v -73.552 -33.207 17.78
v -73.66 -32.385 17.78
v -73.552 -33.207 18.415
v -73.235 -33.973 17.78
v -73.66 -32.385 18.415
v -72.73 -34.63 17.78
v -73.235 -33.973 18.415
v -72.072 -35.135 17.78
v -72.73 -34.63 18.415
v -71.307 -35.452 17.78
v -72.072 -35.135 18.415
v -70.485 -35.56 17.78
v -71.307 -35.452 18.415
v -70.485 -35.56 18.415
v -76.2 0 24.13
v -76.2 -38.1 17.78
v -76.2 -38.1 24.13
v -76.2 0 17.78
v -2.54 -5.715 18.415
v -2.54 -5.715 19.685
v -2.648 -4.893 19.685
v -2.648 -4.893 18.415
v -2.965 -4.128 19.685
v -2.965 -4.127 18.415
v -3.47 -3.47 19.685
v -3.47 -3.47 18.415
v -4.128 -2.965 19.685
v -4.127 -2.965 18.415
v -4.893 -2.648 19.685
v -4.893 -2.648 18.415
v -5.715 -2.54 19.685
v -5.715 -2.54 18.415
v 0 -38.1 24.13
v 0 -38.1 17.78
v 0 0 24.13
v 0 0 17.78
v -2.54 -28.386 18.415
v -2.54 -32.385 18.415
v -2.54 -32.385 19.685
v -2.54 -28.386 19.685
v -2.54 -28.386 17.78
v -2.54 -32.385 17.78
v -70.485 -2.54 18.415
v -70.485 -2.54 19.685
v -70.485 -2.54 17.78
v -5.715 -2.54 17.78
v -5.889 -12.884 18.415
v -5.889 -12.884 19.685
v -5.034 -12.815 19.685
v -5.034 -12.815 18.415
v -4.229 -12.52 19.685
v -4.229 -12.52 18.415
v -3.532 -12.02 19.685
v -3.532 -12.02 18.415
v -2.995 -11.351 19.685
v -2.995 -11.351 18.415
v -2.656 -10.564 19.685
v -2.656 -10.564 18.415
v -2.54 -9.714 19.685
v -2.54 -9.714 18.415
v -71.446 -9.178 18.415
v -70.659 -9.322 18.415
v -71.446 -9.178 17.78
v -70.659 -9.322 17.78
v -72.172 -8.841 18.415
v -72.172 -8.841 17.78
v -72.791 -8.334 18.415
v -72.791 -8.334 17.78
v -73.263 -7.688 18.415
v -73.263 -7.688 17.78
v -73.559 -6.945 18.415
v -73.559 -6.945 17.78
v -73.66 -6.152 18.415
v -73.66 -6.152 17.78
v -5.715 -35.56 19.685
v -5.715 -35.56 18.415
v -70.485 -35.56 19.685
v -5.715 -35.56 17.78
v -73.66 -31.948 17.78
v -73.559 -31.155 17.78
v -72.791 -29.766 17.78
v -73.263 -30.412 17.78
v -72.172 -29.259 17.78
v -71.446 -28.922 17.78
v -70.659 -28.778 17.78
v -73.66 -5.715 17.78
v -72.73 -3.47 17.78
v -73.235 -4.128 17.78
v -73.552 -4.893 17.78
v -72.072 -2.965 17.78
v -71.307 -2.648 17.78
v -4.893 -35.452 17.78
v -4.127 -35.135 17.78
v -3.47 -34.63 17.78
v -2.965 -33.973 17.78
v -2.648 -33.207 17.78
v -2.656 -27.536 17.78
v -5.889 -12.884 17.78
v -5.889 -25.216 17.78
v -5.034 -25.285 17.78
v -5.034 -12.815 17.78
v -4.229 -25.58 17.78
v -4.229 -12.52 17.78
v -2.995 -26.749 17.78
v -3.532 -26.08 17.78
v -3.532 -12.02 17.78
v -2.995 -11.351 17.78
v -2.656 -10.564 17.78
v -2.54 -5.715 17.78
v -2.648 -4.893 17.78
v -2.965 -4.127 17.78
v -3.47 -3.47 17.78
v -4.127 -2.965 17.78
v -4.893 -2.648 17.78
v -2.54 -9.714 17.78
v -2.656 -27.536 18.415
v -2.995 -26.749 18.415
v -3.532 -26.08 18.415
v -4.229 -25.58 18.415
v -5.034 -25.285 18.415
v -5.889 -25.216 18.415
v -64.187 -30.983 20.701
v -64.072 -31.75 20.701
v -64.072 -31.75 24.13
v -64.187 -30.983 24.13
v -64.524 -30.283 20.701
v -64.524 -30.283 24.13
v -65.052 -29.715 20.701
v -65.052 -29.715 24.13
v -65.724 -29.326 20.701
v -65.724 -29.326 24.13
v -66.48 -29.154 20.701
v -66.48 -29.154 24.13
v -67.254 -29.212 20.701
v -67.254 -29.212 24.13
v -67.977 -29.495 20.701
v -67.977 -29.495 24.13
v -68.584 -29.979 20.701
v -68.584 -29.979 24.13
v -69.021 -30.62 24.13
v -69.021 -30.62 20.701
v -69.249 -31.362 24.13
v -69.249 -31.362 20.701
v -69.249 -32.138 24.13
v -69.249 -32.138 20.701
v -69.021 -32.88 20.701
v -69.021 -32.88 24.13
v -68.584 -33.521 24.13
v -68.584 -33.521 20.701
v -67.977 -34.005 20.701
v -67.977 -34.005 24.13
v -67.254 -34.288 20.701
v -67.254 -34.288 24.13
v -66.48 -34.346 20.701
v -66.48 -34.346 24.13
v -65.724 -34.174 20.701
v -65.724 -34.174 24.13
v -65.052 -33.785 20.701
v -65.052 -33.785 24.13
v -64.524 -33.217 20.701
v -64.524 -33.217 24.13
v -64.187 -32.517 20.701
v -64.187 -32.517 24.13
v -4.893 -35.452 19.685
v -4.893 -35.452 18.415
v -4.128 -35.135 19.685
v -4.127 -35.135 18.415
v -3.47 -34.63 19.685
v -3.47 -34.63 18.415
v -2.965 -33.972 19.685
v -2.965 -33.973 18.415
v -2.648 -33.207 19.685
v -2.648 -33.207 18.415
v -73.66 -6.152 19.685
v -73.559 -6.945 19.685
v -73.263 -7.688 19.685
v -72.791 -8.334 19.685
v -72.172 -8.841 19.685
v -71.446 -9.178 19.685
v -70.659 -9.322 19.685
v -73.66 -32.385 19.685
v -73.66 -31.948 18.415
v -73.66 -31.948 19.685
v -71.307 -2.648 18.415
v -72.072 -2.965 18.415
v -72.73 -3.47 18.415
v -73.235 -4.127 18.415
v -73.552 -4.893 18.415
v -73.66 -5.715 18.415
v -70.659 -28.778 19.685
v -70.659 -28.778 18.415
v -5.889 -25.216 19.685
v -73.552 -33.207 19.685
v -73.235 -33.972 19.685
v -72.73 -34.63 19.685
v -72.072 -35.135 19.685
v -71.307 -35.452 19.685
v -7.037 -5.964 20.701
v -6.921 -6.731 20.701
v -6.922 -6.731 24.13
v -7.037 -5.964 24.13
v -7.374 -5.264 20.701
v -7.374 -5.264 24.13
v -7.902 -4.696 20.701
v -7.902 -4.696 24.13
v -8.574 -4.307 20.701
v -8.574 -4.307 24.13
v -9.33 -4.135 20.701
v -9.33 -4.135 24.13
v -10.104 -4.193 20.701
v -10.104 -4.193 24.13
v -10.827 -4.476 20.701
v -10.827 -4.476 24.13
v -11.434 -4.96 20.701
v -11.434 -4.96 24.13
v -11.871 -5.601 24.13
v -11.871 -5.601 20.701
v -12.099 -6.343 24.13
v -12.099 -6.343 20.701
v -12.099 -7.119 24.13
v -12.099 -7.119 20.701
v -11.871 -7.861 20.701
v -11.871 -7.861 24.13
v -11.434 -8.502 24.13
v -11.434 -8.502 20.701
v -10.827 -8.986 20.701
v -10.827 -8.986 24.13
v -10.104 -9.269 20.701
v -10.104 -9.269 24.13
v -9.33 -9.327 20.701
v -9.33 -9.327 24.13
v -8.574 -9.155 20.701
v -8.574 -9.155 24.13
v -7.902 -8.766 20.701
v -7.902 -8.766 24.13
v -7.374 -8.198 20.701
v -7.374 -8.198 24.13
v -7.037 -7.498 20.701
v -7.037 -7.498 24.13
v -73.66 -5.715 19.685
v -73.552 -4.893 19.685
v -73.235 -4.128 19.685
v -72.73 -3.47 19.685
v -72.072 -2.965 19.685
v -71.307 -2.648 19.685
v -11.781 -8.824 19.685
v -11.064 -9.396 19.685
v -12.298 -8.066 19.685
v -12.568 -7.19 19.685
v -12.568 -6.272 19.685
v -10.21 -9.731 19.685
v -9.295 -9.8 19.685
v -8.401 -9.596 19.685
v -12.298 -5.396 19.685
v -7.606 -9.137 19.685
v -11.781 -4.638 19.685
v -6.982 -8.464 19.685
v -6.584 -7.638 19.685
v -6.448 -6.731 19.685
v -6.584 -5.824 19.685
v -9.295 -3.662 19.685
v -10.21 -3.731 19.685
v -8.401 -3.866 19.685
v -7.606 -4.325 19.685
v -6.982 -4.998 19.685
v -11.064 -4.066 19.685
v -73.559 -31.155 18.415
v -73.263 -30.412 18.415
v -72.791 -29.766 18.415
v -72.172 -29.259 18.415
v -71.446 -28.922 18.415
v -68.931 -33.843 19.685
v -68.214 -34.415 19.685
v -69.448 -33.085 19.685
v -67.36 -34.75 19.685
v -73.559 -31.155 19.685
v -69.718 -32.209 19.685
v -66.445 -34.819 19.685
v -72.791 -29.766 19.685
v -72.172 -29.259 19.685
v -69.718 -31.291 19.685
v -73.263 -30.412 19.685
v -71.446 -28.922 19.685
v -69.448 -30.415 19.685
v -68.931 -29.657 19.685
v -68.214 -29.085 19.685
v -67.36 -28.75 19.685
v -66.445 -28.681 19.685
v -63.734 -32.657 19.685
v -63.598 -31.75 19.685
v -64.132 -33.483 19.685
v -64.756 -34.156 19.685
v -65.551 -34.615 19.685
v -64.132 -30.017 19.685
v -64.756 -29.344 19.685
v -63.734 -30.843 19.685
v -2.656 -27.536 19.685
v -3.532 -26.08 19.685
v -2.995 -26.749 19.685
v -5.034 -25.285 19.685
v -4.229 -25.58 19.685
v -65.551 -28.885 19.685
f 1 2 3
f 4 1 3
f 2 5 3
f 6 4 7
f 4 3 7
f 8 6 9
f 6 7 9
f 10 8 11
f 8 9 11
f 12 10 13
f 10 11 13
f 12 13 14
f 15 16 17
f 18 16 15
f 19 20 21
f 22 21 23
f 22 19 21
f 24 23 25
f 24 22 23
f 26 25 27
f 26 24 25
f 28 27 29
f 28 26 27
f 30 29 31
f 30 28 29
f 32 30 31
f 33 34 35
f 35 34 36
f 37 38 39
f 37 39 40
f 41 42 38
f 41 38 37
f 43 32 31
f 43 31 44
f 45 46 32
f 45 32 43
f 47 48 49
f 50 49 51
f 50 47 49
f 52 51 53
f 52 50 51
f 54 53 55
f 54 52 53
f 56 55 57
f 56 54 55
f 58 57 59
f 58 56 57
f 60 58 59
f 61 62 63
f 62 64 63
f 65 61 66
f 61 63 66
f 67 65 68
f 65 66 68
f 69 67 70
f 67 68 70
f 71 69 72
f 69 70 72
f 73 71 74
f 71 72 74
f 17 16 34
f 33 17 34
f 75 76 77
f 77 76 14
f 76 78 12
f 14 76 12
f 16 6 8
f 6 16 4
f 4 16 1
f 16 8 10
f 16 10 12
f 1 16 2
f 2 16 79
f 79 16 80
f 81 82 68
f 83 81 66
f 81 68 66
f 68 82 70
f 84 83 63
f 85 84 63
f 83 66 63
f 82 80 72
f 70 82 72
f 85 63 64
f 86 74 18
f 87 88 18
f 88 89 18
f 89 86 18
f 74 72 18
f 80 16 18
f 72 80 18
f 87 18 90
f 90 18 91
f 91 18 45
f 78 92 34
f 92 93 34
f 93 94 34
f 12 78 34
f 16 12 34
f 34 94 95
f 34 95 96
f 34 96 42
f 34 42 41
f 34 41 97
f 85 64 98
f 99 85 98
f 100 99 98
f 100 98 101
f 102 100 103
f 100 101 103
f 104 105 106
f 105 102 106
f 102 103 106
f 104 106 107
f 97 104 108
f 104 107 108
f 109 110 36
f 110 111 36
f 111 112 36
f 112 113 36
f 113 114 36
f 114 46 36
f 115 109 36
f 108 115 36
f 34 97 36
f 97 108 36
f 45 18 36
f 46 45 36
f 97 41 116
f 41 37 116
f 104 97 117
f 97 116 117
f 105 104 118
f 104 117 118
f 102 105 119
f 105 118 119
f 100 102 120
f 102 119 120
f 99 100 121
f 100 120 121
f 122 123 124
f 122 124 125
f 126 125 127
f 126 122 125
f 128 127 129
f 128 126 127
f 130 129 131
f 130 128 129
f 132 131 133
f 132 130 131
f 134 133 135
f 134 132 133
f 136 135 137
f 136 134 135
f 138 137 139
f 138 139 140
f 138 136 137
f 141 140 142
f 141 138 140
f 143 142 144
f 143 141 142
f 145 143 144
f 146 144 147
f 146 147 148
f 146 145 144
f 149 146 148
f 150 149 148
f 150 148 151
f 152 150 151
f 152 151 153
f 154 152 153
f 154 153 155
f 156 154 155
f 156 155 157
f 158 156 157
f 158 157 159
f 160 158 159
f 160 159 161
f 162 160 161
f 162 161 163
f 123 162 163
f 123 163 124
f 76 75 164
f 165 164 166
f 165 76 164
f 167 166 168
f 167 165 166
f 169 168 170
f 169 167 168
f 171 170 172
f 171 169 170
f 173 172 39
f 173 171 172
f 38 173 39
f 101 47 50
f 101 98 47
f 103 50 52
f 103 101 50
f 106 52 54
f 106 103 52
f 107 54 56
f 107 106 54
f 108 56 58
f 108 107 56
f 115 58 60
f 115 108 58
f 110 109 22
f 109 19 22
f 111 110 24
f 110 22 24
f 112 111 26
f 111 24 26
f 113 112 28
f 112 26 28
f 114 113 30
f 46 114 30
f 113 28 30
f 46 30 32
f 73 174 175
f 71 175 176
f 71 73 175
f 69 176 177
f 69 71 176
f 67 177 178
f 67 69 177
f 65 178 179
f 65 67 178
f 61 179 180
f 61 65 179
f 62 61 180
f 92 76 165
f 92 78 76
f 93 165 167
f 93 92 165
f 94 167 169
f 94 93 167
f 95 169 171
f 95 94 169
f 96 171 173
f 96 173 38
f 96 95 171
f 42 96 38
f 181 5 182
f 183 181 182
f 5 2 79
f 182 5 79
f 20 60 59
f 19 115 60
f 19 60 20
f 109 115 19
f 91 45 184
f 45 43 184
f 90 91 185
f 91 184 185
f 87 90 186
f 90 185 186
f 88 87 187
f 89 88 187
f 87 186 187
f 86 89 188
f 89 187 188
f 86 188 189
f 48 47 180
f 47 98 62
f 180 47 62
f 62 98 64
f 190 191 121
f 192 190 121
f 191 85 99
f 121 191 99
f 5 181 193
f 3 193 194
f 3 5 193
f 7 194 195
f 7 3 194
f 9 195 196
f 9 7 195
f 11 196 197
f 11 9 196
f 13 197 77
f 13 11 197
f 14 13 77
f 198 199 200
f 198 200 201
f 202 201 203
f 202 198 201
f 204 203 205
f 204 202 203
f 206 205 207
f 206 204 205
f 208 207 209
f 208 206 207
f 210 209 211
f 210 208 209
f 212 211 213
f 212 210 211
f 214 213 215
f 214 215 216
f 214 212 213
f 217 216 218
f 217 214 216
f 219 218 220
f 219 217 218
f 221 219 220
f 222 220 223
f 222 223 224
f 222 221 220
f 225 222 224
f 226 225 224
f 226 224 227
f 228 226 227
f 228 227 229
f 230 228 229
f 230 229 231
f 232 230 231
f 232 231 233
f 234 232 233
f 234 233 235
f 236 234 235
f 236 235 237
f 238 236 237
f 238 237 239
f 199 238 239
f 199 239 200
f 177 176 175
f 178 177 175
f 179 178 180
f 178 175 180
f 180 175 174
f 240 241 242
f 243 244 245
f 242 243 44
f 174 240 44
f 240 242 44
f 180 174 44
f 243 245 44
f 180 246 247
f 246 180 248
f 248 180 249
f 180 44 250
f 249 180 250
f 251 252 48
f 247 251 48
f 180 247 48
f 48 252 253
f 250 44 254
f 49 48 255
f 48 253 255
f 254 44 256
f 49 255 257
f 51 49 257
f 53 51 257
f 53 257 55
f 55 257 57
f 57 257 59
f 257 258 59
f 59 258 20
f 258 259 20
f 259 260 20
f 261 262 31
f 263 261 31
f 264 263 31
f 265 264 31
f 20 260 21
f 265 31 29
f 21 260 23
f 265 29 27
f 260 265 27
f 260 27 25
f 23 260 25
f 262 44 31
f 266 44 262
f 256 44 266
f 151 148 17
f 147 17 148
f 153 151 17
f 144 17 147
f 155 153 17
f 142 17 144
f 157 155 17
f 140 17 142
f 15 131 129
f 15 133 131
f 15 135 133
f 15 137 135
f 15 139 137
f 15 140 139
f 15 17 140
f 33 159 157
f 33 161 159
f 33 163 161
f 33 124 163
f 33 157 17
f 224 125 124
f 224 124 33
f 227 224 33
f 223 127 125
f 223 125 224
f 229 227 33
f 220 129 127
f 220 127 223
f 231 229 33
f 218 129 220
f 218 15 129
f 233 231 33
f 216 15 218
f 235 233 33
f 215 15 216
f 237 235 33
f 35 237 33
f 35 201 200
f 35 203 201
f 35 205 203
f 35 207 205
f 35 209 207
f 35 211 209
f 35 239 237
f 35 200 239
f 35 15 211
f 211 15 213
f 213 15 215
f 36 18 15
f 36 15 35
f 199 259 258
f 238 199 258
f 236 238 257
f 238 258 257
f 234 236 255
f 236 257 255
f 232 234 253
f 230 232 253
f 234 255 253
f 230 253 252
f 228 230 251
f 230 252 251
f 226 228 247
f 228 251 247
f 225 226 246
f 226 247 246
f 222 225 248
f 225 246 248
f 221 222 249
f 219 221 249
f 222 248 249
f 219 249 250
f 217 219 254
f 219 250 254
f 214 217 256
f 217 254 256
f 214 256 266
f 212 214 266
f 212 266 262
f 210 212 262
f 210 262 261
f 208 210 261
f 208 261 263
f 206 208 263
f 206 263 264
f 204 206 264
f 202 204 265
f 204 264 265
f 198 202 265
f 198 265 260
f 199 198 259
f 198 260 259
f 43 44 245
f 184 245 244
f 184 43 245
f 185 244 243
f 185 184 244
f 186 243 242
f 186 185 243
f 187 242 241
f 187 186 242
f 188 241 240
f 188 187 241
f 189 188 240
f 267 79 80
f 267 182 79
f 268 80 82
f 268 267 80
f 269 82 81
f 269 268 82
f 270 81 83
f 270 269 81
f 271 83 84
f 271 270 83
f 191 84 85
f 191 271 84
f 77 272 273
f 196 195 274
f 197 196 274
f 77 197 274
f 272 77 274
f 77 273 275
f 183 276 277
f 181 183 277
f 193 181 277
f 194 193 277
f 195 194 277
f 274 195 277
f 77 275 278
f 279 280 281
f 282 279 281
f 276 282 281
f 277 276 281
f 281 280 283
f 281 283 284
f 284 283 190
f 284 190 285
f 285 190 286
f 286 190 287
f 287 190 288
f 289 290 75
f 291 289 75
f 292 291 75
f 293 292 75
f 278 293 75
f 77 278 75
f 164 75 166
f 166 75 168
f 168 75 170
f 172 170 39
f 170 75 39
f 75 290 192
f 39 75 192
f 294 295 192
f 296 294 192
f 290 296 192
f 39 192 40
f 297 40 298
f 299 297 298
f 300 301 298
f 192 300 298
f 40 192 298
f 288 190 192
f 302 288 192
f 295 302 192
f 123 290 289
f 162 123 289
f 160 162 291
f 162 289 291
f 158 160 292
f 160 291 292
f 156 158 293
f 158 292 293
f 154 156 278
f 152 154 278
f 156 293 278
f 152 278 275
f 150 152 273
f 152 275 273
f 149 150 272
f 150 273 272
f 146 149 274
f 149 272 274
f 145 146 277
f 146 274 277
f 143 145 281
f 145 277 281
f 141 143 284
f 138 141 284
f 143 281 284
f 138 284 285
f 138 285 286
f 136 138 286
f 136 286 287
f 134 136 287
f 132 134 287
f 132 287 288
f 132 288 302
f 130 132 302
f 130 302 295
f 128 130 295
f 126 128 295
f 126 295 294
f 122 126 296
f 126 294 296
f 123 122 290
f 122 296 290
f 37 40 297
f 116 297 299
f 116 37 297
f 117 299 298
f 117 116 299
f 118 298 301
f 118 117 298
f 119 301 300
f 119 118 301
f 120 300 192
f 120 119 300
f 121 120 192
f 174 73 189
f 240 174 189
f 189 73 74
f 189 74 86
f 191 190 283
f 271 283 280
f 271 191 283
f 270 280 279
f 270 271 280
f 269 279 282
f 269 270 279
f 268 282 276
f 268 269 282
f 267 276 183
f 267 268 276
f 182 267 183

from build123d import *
from OCP.BRepFilletAPI import BRepFilletAPI_MakeChamfer

# Parameters (mm, degrees)
SKETCH1_W            = 76.2
SKETCH1_H            = 38.1
SKETCH1_R            = 2.6035
BOSS_EXTRUDE1_DEPTH  = 6.35
SKETCH4_R            = 2.6035
CUT_EXTRUDE1_DEPTH   = 0.635
SKETCH14_W           = 76.2
SKETCH14_H           = 38.1
SKETCH14_W_2         = 71.12
SKETCH14_H_2         = 33.02
BOSS_EXTRUDE10_DEPTH = 0.635
FILLET6_R            = 3.175
CUT_EXTRUDE4_DEPTH   = 1.27
CUT_EXTRUDE5_DEPTH   = 1.27
CHAMFER1_SIZE        = 1.016
CHAMFER1_SIZE2       = 0.473768581


with BuildPart() as part:
    # Sketch1 → Boss-Extrude1 (new body)
    with BuildSketch(Plane.XY.offset(17.78)):
        with Locations((-38.1, -19.05)):
            Rectangle(SKETCH1_W, SKETCH1_H)
        with Locations((-9.525, -6.731)):
            Circle(SKETCH1_R, mode=Mode.SUBTRACT)
        with Locations((-66.675, -31.75)):
            Circle(SKETCH1_R, mode=Mode.SUBTRACT)
    extrude(amount=BOSS_EXTRUDE1_DEPTH)

    # Sketch4 → Cut-Extrude1 (cut)
    # profile 1 of 2: a face of its own
    with BuildSketch(Plane(origin=(0, 0, 17.78), x_dir=(-1, 0, 0), z_dir=(0, 0, -1))):
        Polygon((0, 0), (0, -13.208), (76.2, -9.017), (76.2, 0), align=None)
        with Locations((9.525, -6.731)):
            Circle(SKETCH4_R, mode=Mode.SUBTRACT)
    # profile 2 of 2: a face of its own
    with BuildSketch(Plane(origin=(0, 0, 17.78), x_dir=(-1, 0, 0), z_dir=(0, 0, -1))):
        Polygon((76.2, -29.083), (0, -24.892), (0, -38.1), (76.2, -38.1), align=None)
        with Locations((66.675, -31.75)):
            Circle(SKETCH4_R, mode=Mode.SUBTRACT)
    extrude(amount=-CUT_EXTRUDE1_DEPTH, mode=Mode.SUBTRACT)

    # Sketch14 → Boss-Extrude10 (add, symmetric)
    with BuildSketch(Plane(origin=(0, 0, 18.415), x_dir=(-1, 0, 0), z_dir=(0, 0, -1))):
        with Locations((38.1, -19.05)):
            Rectangle(SKETCH14_W, SKETCH14_H)
        with Locations((38.1, -19.05)):
            Rectangle(SKETCH14_W_2, SKETCH14_H_2, mode=Mode.SUBTRACT)
    extrude(amount=BOSS_EXTRUDE10_DEPTH, both=True)

    # Fillet6
    fillet6_edges = [part.edges().sort_by_distance(p)[0] for p in [
        (-2.54, -13.0683, 18.0975),
        (-73.66, -9.1567, 18.0975),
        (-73.66, -2.54, 18.0975),
        (-2.54, -2.54, 18.0975),
        (-2.54, -25.0317, 18.0975),
        (-2.54, -35.56, 18.0975),
        (-73.66, -35.56, 18.0975),
        (-73.66, -28.9433, 18.0975),
    ]]
    fillet(fillet6_edges, radius=FILLET6_R)

    # Sketch17 → Cut-Extrude4 (cut)
    with BuildSketch(Plane(origin=(0, 0, 18.415), x_dir=(-1, 0, 0), z_dir=(0, 0, -1))):
        with BuildLine():
            Line((5.715, -2.54), (70.485, -2.54))
            ThreePointArc((70.485, -2.54), (72.73006403, -3.46993597), (73.66, -5.715))
            Line((73.66, -5.715), (73.66, -6.151526439))
            ThreePointArc((73.66, -6.151526439), (72.790886239, -8.334073954), (70.659361477, -9.321735119))
            Line((70.659361477, -9.321735119), (5.889361477, -12.884085119))
            ThreePointArc((5.889361477, -12.884085119), (3.532452485, -12.019762677), (2.54, -9.713876439))
            Line((2.54, -9.713876439), (2.54, -5.715))
            ThreePointArc((2.54, -5.715), (3.46993597, -3.46993597), (5.715, -2.54))
        make_face()
    extrude(amount=-CUT_EXTRUDE4_DEPTH, mode=Mode.SUBTRACT)

    # Sketch20 → Cut-Extrude5 (cut)
    with BuildSketch(Plane(origin=(0, 0, 18.415), x_dir=(-1, 0, 0), z_dir=(0, 0, -1))):
        with BuildLine():
            Line((5.889361477, -25.215914881), (70.659361477, -28.778264881))
            ThreePointArc((70.659361477, -28.778264881), (72.790886239, -29.765926046), (73.66, -31.948473561))
            Line((73.66, -31.948473561), (73.66, -32.385))
            ThreePointArc((73.66, -32.385), (72.73006403, -34.63006403), (70.485, -35.56))
            Line((70.485, -35.56), (5.715, -35.56))
            ThreePointArc((5.715, -35.56), (3.46993597, -34.63006403), (2.54, -32.385))
            Line((2.54, -32.385), (2.54, -28.386123561))
            ThreePointArc((2.54, -28.386123561), (3.532452485, -26.080237323), (5.889361477, -25.215914881))
        make_face()
    extrude(amount=-CUT_EXTRUDE5_DEPTH, mode=Mode.SUBTRACT)

    # Chamfer1: one chamfer whose edges measure the first distance from different faces: ONE call of the kernel's chamfer builder (chamfer() names one face for all edges)
    chamfer1_edges_1 = [part.edges().sort_by_distance(p)[0] for p in [
        (-12.1285, -6.731, 19.685),
    ]]
    chamfer1_side_1 = [part.faces().sort_by_distance(p)[0] for p in [
        (-12.1285, -6.731, 21.9075),
    ]]
    chamfer1_edges_2 = [part.edges().sort_by_distance(p)[0] for p in [
        (-69.2785, -31.75, 19.685),
    ]]
    chamfer1_side_2 = [part.faces().sort_by_distance(p)[0] for p in [
        (-69.2785, -31.75, 21.9075),
    ]]
    chamfer1 = BRepFilletAPI_MakeChamfer(part.part.solid().wrapped)
    for e in chamfer1_edges_1:
        chamfer1.Add(CHAMFER1_SIZE, CHAMFER1_SIZE2, e.wrapped, chamfer1_side_1[0].wrapped)  # the first distance lies on this face
    for e in chamfer1_edges_2:
        chamfer1.Add(CHAMFER1_SIZE, CHAMFER1_SIZE2, e.wrapped, chamfer1_side_2[0].wrapped)  # the first distance lies on this face
    add(Compound.cast(chamfer1.Shape()), mode=Mode.REPLACE)


solid = part.part
